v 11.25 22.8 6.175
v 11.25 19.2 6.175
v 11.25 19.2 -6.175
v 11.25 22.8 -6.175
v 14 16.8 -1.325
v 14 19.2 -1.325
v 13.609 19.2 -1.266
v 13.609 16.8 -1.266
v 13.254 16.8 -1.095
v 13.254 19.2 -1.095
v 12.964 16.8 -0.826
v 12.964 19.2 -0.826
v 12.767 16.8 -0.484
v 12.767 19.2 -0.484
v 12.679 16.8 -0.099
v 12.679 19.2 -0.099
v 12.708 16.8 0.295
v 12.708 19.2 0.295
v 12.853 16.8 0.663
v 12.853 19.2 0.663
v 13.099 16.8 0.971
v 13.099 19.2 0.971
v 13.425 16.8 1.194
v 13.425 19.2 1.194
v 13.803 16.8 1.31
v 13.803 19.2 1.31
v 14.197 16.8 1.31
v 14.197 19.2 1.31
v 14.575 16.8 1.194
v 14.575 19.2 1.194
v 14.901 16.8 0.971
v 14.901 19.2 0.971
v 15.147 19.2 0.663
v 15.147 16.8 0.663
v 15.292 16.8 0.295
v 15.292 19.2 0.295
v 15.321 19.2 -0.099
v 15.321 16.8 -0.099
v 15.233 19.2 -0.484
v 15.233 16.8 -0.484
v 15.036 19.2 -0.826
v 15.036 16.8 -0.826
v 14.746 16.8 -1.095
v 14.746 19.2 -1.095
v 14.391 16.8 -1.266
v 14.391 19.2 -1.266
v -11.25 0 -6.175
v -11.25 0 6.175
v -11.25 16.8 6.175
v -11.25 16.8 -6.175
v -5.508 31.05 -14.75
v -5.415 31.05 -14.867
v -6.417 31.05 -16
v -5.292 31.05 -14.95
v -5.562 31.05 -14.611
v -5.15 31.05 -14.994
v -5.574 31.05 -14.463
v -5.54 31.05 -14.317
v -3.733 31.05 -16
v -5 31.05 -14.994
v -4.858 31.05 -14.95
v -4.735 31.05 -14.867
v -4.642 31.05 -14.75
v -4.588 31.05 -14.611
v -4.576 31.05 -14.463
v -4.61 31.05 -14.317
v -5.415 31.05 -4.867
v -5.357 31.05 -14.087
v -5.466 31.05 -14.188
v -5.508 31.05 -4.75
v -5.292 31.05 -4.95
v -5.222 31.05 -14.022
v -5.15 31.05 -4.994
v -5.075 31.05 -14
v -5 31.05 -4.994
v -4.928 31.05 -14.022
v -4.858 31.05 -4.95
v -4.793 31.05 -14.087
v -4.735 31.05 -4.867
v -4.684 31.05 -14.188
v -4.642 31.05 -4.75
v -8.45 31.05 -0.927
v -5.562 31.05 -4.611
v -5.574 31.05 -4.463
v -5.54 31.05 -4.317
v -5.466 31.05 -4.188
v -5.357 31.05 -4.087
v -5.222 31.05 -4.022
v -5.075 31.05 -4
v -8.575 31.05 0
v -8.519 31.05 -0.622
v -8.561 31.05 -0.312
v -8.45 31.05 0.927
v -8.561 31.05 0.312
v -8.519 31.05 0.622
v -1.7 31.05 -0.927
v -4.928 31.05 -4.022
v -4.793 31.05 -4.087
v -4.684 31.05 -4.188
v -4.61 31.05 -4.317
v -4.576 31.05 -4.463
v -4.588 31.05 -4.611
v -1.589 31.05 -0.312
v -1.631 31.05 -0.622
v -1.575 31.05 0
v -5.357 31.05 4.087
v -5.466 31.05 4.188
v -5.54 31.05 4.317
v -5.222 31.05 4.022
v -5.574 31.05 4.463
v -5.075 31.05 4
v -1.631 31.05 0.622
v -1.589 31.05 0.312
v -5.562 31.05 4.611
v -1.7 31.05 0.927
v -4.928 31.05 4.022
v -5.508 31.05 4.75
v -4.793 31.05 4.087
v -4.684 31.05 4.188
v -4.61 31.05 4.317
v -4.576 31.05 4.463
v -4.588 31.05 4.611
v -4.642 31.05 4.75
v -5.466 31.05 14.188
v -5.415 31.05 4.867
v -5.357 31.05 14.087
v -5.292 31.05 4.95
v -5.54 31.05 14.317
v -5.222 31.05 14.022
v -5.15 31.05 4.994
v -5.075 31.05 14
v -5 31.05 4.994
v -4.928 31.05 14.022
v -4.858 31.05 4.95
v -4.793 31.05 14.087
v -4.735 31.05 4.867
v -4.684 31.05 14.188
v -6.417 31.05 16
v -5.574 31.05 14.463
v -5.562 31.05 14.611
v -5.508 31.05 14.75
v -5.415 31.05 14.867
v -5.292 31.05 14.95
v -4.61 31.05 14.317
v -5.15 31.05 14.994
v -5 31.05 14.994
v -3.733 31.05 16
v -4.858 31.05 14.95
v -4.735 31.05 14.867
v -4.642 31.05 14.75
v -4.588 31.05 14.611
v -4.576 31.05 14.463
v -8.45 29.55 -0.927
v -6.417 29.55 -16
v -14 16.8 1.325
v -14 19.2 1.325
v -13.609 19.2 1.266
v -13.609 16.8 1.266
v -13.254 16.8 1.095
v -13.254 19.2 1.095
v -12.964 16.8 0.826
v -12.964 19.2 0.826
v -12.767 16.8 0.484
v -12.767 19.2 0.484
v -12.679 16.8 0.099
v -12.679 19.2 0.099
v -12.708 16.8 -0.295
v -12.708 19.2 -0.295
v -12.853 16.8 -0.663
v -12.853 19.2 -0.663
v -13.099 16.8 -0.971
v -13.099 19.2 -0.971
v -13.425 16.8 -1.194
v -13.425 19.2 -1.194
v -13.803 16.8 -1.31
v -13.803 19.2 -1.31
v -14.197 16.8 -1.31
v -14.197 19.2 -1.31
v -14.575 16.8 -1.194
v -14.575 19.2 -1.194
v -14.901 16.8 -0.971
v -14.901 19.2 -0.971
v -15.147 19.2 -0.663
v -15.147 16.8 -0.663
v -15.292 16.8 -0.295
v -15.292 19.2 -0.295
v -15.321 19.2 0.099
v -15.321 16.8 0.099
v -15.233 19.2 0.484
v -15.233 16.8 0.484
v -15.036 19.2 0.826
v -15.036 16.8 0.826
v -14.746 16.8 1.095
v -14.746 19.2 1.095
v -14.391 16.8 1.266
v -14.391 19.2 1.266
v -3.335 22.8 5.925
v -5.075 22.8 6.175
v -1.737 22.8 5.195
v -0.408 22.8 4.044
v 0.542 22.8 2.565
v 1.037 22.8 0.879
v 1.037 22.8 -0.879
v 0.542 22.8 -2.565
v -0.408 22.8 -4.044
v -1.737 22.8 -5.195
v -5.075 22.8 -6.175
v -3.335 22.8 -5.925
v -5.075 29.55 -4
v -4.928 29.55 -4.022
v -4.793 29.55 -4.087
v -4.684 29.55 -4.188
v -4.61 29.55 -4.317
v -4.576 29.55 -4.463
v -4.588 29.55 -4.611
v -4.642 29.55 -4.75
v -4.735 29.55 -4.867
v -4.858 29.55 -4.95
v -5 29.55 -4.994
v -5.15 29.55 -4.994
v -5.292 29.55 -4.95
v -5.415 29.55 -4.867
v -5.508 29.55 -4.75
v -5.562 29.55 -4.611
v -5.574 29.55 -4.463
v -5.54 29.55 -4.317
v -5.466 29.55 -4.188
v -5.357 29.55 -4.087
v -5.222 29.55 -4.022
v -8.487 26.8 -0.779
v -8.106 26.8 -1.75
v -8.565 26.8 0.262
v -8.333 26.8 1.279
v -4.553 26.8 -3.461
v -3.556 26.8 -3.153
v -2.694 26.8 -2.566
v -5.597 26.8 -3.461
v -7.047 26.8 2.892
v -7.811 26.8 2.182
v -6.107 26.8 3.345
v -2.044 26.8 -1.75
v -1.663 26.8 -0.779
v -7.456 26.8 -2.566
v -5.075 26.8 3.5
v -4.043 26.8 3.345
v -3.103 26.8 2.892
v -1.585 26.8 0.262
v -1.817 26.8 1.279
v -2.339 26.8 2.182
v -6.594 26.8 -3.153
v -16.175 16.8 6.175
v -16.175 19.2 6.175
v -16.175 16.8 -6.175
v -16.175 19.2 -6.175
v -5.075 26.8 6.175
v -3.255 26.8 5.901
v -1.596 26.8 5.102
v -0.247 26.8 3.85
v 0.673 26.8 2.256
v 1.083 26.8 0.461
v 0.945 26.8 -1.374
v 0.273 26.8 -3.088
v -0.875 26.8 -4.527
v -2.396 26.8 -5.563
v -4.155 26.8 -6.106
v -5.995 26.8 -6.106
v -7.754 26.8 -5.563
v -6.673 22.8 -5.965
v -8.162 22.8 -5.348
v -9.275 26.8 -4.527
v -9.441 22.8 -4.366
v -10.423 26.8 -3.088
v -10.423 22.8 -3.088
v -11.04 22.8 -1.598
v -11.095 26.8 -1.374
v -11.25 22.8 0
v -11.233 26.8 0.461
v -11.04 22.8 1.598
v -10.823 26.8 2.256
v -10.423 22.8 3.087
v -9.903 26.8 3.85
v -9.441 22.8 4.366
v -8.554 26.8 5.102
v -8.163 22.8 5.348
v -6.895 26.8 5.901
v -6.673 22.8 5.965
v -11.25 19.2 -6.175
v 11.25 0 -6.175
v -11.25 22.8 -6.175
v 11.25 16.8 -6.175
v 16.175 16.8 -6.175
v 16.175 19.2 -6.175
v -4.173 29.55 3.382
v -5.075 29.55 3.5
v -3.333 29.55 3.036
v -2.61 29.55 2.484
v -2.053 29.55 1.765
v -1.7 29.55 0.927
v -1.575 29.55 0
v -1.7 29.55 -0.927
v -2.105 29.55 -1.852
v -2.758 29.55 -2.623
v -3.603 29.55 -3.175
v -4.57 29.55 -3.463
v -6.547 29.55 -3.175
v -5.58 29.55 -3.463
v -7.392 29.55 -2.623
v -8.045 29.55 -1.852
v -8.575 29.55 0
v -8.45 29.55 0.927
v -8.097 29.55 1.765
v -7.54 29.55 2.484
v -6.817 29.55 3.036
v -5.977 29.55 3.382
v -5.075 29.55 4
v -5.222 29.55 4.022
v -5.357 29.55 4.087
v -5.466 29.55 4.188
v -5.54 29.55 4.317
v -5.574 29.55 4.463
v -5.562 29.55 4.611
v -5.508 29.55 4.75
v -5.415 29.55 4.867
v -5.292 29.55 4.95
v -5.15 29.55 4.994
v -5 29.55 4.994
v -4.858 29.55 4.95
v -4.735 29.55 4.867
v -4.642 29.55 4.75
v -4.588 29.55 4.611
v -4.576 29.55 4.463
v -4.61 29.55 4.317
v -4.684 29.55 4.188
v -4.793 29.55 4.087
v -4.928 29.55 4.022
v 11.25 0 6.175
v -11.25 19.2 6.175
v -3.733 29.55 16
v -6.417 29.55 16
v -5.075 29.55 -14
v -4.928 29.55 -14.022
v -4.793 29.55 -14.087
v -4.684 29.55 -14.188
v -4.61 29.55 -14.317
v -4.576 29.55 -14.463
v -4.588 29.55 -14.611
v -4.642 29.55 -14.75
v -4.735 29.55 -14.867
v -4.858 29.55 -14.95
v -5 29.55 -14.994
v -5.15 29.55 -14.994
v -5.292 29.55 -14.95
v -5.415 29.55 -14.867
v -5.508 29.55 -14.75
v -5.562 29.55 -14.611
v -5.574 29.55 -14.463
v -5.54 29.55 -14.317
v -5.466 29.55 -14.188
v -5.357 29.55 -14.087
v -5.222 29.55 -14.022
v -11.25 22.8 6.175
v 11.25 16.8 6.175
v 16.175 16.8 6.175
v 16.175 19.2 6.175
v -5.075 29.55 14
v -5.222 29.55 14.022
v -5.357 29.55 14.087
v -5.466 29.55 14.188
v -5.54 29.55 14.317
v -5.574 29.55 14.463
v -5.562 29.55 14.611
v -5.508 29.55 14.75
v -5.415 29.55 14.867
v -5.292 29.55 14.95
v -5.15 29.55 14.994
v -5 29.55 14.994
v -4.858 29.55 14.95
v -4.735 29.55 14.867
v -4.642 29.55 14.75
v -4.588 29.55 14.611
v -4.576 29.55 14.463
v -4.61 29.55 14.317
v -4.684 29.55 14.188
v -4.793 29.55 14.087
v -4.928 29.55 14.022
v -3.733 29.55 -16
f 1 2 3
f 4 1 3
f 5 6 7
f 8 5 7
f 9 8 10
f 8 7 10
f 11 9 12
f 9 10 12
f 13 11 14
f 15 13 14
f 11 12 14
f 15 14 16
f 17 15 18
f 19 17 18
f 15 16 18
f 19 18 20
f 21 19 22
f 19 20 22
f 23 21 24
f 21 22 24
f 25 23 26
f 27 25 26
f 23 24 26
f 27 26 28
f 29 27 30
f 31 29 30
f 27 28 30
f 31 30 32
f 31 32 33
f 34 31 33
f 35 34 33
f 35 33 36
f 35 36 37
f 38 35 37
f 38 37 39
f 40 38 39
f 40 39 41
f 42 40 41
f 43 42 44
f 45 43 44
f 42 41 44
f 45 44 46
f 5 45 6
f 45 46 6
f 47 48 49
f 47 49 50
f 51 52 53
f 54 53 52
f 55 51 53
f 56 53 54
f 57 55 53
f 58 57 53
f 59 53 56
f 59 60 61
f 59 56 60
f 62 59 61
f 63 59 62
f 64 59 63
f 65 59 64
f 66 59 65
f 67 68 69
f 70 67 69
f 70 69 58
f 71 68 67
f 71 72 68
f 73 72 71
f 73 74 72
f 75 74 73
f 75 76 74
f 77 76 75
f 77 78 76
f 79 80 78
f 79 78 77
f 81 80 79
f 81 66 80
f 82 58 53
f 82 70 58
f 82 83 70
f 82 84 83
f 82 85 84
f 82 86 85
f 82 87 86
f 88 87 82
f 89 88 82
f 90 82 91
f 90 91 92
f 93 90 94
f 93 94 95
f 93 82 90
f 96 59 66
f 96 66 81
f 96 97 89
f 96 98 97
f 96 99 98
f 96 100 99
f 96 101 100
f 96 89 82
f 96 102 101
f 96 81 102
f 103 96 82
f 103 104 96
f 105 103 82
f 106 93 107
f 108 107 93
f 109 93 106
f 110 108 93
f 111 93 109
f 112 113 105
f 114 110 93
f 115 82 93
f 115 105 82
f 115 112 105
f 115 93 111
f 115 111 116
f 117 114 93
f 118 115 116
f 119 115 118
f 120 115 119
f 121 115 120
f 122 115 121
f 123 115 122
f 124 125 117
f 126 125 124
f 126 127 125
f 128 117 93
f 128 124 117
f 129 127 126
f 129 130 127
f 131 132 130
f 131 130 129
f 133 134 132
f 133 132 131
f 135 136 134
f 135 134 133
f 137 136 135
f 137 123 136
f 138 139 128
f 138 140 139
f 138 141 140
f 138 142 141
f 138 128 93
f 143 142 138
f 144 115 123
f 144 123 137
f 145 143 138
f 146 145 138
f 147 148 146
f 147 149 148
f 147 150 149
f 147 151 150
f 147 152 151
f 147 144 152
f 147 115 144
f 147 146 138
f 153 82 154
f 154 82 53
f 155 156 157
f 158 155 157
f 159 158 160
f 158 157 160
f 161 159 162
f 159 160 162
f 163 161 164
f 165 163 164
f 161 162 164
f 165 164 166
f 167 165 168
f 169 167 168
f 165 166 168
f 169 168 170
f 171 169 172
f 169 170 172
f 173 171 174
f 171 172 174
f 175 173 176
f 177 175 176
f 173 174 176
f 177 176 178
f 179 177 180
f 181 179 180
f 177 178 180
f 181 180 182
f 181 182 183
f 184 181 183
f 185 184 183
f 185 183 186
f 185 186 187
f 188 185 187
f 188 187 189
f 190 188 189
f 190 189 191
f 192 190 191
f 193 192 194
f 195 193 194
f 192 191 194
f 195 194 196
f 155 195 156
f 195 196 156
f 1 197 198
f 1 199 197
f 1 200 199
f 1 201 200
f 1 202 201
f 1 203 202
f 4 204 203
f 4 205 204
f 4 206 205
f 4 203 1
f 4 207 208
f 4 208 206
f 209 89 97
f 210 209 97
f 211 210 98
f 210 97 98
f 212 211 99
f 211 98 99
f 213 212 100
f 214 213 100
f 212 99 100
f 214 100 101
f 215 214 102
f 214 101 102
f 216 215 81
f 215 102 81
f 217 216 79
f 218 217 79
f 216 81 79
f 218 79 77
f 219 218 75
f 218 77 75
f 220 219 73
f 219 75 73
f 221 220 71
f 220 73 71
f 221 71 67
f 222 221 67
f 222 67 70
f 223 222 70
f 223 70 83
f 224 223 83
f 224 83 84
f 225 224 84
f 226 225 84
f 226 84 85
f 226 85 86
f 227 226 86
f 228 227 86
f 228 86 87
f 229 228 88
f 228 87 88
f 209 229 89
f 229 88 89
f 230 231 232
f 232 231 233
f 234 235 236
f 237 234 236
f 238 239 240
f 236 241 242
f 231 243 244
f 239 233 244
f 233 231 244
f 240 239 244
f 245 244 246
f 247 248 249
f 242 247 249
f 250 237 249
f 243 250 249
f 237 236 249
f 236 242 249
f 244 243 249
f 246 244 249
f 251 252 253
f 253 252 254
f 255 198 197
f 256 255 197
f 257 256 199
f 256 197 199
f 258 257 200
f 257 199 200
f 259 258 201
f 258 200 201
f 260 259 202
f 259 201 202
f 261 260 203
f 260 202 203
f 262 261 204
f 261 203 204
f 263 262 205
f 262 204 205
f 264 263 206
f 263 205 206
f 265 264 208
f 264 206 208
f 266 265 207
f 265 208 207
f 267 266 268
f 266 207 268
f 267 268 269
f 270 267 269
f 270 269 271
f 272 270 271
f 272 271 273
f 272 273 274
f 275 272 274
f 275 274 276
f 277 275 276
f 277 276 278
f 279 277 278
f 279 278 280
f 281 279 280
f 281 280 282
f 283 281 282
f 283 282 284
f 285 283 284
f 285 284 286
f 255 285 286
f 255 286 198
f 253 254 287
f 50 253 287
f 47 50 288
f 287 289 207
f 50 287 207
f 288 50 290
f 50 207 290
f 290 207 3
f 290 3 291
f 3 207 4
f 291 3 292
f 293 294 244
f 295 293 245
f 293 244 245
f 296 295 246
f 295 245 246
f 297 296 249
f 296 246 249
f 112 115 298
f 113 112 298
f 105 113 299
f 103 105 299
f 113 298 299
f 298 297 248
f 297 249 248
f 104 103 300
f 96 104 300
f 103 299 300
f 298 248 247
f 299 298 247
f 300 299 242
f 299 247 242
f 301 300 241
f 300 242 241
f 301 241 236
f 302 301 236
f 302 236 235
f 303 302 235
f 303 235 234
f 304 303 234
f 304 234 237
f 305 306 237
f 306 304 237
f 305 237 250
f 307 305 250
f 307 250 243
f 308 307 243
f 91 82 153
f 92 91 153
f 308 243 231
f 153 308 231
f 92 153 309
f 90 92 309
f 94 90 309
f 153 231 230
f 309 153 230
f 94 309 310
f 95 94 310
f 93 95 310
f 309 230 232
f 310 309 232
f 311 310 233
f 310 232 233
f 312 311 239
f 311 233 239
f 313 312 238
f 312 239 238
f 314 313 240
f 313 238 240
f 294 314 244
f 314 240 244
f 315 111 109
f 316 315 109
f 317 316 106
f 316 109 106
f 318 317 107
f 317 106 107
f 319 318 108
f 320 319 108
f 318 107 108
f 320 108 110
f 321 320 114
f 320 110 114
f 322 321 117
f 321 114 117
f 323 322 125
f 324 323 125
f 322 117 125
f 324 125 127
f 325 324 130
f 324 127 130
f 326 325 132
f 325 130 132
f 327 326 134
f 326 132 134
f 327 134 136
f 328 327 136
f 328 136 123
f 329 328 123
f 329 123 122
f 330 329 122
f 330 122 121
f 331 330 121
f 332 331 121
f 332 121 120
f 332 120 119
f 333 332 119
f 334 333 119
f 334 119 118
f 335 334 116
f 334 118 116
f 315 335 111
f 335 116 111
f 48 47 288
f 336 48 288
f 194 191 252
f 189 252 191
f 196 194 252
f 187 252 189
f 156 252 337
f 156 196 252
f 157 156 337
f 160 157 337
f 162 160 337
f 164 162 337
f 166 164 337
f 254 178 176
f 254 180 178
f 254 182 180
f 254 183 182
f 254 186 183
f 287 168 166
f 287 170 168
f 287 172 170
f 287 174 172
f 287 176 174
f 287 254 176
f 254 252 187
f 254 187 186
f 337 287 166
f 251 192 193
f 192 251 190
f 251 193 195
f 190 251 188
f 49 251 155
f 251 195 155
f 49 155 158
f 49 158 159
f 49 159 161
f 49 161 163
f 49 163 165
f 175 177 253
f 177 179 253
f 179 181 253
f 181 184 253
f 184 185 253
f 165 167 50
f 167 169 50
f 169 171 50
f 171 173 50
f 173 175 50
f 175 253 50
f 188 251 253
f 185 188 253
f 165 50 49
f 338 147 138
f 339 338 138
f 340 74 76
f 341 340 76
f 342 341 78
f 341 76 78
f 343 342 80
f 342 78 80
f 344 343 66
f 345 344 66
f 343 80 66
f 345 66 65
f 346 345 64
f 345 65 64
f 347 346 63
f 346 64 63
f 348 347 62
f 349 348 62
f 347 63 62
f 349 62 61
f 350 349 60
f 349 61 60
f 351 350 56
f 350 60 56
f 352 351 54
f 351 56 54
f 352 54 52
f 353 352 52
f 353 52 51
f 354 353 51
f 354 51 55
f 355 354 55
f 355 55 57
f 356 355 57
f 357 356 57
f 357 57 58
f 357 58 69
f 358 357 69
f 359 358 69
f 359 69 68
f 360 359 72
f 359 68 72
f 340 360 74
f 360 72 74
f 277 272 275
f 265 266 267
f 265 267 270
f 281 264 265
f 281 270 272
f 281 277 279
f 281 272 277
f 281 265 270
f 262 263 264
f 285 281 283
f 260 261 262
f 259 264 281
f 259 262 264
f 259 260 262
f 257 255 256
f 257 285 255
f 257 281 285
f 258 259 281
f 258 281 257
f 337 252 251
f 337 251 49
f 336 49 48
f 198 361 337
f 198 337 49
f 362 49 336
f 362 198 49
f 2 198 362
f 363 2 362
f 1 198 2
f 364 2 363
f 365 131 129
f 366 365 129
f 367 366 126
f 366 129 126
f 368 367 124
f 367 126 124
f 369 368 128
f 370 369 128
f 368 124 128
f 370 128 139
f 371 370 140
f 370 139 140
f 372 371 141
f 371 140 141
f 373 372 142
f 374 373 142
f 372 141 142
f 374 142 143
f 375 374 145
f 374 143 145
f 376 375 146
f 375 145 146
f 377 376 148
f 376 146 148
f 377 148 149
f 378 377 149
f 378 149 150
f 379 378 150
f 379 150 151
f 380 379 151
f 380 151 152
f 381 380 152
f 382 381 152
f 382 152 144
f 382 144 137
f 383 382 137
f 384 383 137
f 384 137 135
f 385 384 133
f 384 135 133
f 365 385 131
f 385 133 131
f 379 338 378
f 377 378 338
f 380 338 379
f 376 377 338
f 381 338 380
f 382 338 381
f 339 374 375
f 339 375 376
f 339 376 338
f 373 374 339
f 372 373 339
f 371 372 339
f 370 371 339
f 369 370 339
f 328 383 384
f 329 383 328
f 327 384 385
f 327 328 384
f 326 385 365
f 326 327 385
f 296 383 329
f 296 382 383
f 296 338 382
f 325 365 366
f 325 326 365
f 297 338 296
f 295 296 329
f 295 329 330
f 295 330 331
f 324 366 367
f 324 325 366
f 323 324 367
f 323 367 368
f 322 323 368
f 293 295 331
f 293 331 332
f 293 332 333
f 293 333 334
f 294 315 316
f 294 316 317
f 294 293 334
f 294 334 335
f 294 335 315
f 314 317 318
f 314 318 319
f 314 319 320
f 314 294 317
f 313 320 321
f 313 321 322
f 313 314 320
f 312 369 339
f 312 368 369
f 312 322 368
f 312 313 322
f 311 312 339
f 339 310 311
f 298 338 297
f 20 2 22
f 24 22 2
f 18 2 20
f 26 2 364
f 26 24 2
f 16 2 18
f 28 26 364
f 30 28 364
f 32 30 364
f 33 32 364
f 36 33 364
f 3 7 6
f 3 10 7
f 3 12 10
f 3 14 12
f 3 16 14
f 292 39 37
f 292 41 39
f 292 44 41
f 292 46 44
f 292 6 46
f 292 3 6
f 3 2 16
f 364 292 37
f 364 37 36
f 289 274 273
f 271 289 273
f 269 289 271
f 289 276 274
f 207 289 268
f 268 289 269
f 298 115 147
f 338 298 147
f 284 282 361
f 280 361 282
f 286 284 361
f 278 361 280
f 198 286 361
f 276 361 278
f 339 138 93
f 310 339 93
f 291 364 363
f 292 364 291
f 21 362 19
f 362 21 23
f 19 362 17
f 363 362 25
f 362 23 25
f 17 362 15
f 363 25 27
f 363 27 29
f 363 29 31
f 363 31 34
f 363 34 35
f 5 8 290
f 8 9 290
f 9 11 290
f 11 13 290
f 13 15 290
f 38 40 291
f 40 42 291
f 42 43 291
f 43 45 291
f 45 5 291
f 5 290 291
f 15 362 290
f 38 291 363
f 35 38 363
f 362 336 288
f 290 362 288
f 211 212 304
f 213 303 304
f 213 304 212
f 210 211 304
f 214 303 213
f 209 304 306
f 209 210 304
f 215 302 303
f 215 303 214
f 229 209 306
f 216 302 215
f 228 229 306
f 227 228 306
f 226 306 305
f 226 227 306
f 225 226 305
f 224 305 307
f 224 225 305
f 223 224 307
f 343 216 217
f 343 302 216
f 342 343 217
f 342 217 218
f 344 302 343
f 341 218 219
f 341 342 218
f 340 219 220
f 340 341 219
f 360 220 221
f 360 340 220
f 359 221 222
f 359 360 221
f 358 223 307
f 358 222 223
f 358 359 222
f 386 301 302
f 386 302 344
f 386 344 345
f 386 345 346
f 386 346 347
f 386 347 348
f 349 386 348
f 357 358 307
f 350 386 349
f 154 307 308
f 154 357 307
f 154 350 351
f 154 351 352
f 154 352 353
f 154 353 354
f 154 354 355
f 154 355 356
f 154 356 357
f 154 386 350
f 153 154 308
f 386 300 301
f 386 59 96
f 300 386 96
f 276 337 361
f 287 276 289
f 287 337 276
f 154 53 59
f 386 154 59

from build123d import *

# Parameters (mm, degrees)
SKETCH_1_W      = 22.5
SKETCH_1_H      = 12.35
EXTRUDE_1_DEPTH = 22.8
EXTRUDE_START   = -3.6
SKETCH_2_W      = 32.35
SKETCH_2_H      = 12.35
SKETCH_2_R      = 1.325
EXTRUDE_2_DEPTH = 2.4
SKETCH_3_R      = 6.175
EXTRUDE_3_DEPTH = 4
SKETCH_4_R      = 3.5
EXTRUDE_4_DEPTH = 4.25
SKETCH_5_R      = 0.5
EXTRUDE_5_DEPTH = 1.5


with BuildPart() as part:
    # 草图1 → 凸台-拉伸1 (new body)
    with BuildSketch(Plane(origin=(0, 0, 0), x_dir=(1, 0, 0), z_dir=(0, 1, 0))):
        Rectangle(SKETCH_1_W, SKETCH_1_H)
    extrude(amount=EXTRUDE_1_DEPTH)

    # 草图2 → 凸台-拉伸2 (add)
    with BuildSketch(Plane(origin=(0, 22.8, 0), x_dir=(1, 0, 0), z_dir=(0, 1, 0)).offset(EXTRUDE_START)):
        Rectangle(SKETCH_2_W, SKETCH_2_H)
        with Locations(Location((-14, 0, 0), (0, 0, 270))):
            Circle(SKETCH_2_R, mode=Mode.SUBTRACT)
        with Locations(Location((14, 0, 0), (0, 0, 90))):
            Circle(SKETCH_2_R, mode=Mode.SUBTRACT)
    extrude(amount=-EXTRUDE_2_DEPTH)

    # 草图3 → 凸台-拉伸3 (add)
    with BuildSketch(Plane(origin=(0, 22.8, 0), x_dir=(1, 0, 0), z_dir=(0, 1, 0))):
        with Locations(Location((-5.075, 0, 0), (0, 0, 270))):
            Circle(SKETCH_3_R)
    extrude(amount=EXTRUDE_3_DEPTH)


with BuildPart() as body_2:
    # 草图4 → 凸台-拉伸4 (new body)
    with BuildSketch(Plane(origin=(0, 26.8, 0), x_dir=(1, 0, 0), z_dir=(0, 1, 0))):
        with Locations(Location((-5.075, 0, 0), (0, 0, 270))):
            Circle(SKETCH_4_R)
    extrude(amount=EXTRUDE_4_DEPTH)

    # 草图5 → 凸台-拉伸5 (add)
    with BuildSketch(Plane(origin=(0, 31.05, 0), x_dir=(1, 0, 0), z_dir=(0, 1, 0))):
        Polygon((-8.575, 0), (-6.416535944, 16), (-3.733464056, 16), (-1.575, 0), (-3.733464056, -16), (-6.416535944, -16), align=None)
        with Locations(Location((-5.075, 14.5, 0), (0, 0, 270))):
            Circle(SKETCH_5_R, mode=Mode.SUBTRACT)
        with Locations(Location((-5.075, 4.5, 0), (0, 0, 270))):
            Circle(SKETCH_5_R, mode=Mode.SUBTRACT)
        with Locations(Location((-5.075, -4.5, 0), (0, 0, 90))):
            Circle(SKETCH_5_R, mode=Mode.SUBTRACT)
        with Locations(Location((-5.075, -14.5, 0), (0, 0, 90))):
            Circle(SKETCH_5_R, mode=Mode.SUBTRACT)
    extrude(amount=-EXTRUDE_5_DEPTH)


solid = Compound([part.part, body_2.part])
